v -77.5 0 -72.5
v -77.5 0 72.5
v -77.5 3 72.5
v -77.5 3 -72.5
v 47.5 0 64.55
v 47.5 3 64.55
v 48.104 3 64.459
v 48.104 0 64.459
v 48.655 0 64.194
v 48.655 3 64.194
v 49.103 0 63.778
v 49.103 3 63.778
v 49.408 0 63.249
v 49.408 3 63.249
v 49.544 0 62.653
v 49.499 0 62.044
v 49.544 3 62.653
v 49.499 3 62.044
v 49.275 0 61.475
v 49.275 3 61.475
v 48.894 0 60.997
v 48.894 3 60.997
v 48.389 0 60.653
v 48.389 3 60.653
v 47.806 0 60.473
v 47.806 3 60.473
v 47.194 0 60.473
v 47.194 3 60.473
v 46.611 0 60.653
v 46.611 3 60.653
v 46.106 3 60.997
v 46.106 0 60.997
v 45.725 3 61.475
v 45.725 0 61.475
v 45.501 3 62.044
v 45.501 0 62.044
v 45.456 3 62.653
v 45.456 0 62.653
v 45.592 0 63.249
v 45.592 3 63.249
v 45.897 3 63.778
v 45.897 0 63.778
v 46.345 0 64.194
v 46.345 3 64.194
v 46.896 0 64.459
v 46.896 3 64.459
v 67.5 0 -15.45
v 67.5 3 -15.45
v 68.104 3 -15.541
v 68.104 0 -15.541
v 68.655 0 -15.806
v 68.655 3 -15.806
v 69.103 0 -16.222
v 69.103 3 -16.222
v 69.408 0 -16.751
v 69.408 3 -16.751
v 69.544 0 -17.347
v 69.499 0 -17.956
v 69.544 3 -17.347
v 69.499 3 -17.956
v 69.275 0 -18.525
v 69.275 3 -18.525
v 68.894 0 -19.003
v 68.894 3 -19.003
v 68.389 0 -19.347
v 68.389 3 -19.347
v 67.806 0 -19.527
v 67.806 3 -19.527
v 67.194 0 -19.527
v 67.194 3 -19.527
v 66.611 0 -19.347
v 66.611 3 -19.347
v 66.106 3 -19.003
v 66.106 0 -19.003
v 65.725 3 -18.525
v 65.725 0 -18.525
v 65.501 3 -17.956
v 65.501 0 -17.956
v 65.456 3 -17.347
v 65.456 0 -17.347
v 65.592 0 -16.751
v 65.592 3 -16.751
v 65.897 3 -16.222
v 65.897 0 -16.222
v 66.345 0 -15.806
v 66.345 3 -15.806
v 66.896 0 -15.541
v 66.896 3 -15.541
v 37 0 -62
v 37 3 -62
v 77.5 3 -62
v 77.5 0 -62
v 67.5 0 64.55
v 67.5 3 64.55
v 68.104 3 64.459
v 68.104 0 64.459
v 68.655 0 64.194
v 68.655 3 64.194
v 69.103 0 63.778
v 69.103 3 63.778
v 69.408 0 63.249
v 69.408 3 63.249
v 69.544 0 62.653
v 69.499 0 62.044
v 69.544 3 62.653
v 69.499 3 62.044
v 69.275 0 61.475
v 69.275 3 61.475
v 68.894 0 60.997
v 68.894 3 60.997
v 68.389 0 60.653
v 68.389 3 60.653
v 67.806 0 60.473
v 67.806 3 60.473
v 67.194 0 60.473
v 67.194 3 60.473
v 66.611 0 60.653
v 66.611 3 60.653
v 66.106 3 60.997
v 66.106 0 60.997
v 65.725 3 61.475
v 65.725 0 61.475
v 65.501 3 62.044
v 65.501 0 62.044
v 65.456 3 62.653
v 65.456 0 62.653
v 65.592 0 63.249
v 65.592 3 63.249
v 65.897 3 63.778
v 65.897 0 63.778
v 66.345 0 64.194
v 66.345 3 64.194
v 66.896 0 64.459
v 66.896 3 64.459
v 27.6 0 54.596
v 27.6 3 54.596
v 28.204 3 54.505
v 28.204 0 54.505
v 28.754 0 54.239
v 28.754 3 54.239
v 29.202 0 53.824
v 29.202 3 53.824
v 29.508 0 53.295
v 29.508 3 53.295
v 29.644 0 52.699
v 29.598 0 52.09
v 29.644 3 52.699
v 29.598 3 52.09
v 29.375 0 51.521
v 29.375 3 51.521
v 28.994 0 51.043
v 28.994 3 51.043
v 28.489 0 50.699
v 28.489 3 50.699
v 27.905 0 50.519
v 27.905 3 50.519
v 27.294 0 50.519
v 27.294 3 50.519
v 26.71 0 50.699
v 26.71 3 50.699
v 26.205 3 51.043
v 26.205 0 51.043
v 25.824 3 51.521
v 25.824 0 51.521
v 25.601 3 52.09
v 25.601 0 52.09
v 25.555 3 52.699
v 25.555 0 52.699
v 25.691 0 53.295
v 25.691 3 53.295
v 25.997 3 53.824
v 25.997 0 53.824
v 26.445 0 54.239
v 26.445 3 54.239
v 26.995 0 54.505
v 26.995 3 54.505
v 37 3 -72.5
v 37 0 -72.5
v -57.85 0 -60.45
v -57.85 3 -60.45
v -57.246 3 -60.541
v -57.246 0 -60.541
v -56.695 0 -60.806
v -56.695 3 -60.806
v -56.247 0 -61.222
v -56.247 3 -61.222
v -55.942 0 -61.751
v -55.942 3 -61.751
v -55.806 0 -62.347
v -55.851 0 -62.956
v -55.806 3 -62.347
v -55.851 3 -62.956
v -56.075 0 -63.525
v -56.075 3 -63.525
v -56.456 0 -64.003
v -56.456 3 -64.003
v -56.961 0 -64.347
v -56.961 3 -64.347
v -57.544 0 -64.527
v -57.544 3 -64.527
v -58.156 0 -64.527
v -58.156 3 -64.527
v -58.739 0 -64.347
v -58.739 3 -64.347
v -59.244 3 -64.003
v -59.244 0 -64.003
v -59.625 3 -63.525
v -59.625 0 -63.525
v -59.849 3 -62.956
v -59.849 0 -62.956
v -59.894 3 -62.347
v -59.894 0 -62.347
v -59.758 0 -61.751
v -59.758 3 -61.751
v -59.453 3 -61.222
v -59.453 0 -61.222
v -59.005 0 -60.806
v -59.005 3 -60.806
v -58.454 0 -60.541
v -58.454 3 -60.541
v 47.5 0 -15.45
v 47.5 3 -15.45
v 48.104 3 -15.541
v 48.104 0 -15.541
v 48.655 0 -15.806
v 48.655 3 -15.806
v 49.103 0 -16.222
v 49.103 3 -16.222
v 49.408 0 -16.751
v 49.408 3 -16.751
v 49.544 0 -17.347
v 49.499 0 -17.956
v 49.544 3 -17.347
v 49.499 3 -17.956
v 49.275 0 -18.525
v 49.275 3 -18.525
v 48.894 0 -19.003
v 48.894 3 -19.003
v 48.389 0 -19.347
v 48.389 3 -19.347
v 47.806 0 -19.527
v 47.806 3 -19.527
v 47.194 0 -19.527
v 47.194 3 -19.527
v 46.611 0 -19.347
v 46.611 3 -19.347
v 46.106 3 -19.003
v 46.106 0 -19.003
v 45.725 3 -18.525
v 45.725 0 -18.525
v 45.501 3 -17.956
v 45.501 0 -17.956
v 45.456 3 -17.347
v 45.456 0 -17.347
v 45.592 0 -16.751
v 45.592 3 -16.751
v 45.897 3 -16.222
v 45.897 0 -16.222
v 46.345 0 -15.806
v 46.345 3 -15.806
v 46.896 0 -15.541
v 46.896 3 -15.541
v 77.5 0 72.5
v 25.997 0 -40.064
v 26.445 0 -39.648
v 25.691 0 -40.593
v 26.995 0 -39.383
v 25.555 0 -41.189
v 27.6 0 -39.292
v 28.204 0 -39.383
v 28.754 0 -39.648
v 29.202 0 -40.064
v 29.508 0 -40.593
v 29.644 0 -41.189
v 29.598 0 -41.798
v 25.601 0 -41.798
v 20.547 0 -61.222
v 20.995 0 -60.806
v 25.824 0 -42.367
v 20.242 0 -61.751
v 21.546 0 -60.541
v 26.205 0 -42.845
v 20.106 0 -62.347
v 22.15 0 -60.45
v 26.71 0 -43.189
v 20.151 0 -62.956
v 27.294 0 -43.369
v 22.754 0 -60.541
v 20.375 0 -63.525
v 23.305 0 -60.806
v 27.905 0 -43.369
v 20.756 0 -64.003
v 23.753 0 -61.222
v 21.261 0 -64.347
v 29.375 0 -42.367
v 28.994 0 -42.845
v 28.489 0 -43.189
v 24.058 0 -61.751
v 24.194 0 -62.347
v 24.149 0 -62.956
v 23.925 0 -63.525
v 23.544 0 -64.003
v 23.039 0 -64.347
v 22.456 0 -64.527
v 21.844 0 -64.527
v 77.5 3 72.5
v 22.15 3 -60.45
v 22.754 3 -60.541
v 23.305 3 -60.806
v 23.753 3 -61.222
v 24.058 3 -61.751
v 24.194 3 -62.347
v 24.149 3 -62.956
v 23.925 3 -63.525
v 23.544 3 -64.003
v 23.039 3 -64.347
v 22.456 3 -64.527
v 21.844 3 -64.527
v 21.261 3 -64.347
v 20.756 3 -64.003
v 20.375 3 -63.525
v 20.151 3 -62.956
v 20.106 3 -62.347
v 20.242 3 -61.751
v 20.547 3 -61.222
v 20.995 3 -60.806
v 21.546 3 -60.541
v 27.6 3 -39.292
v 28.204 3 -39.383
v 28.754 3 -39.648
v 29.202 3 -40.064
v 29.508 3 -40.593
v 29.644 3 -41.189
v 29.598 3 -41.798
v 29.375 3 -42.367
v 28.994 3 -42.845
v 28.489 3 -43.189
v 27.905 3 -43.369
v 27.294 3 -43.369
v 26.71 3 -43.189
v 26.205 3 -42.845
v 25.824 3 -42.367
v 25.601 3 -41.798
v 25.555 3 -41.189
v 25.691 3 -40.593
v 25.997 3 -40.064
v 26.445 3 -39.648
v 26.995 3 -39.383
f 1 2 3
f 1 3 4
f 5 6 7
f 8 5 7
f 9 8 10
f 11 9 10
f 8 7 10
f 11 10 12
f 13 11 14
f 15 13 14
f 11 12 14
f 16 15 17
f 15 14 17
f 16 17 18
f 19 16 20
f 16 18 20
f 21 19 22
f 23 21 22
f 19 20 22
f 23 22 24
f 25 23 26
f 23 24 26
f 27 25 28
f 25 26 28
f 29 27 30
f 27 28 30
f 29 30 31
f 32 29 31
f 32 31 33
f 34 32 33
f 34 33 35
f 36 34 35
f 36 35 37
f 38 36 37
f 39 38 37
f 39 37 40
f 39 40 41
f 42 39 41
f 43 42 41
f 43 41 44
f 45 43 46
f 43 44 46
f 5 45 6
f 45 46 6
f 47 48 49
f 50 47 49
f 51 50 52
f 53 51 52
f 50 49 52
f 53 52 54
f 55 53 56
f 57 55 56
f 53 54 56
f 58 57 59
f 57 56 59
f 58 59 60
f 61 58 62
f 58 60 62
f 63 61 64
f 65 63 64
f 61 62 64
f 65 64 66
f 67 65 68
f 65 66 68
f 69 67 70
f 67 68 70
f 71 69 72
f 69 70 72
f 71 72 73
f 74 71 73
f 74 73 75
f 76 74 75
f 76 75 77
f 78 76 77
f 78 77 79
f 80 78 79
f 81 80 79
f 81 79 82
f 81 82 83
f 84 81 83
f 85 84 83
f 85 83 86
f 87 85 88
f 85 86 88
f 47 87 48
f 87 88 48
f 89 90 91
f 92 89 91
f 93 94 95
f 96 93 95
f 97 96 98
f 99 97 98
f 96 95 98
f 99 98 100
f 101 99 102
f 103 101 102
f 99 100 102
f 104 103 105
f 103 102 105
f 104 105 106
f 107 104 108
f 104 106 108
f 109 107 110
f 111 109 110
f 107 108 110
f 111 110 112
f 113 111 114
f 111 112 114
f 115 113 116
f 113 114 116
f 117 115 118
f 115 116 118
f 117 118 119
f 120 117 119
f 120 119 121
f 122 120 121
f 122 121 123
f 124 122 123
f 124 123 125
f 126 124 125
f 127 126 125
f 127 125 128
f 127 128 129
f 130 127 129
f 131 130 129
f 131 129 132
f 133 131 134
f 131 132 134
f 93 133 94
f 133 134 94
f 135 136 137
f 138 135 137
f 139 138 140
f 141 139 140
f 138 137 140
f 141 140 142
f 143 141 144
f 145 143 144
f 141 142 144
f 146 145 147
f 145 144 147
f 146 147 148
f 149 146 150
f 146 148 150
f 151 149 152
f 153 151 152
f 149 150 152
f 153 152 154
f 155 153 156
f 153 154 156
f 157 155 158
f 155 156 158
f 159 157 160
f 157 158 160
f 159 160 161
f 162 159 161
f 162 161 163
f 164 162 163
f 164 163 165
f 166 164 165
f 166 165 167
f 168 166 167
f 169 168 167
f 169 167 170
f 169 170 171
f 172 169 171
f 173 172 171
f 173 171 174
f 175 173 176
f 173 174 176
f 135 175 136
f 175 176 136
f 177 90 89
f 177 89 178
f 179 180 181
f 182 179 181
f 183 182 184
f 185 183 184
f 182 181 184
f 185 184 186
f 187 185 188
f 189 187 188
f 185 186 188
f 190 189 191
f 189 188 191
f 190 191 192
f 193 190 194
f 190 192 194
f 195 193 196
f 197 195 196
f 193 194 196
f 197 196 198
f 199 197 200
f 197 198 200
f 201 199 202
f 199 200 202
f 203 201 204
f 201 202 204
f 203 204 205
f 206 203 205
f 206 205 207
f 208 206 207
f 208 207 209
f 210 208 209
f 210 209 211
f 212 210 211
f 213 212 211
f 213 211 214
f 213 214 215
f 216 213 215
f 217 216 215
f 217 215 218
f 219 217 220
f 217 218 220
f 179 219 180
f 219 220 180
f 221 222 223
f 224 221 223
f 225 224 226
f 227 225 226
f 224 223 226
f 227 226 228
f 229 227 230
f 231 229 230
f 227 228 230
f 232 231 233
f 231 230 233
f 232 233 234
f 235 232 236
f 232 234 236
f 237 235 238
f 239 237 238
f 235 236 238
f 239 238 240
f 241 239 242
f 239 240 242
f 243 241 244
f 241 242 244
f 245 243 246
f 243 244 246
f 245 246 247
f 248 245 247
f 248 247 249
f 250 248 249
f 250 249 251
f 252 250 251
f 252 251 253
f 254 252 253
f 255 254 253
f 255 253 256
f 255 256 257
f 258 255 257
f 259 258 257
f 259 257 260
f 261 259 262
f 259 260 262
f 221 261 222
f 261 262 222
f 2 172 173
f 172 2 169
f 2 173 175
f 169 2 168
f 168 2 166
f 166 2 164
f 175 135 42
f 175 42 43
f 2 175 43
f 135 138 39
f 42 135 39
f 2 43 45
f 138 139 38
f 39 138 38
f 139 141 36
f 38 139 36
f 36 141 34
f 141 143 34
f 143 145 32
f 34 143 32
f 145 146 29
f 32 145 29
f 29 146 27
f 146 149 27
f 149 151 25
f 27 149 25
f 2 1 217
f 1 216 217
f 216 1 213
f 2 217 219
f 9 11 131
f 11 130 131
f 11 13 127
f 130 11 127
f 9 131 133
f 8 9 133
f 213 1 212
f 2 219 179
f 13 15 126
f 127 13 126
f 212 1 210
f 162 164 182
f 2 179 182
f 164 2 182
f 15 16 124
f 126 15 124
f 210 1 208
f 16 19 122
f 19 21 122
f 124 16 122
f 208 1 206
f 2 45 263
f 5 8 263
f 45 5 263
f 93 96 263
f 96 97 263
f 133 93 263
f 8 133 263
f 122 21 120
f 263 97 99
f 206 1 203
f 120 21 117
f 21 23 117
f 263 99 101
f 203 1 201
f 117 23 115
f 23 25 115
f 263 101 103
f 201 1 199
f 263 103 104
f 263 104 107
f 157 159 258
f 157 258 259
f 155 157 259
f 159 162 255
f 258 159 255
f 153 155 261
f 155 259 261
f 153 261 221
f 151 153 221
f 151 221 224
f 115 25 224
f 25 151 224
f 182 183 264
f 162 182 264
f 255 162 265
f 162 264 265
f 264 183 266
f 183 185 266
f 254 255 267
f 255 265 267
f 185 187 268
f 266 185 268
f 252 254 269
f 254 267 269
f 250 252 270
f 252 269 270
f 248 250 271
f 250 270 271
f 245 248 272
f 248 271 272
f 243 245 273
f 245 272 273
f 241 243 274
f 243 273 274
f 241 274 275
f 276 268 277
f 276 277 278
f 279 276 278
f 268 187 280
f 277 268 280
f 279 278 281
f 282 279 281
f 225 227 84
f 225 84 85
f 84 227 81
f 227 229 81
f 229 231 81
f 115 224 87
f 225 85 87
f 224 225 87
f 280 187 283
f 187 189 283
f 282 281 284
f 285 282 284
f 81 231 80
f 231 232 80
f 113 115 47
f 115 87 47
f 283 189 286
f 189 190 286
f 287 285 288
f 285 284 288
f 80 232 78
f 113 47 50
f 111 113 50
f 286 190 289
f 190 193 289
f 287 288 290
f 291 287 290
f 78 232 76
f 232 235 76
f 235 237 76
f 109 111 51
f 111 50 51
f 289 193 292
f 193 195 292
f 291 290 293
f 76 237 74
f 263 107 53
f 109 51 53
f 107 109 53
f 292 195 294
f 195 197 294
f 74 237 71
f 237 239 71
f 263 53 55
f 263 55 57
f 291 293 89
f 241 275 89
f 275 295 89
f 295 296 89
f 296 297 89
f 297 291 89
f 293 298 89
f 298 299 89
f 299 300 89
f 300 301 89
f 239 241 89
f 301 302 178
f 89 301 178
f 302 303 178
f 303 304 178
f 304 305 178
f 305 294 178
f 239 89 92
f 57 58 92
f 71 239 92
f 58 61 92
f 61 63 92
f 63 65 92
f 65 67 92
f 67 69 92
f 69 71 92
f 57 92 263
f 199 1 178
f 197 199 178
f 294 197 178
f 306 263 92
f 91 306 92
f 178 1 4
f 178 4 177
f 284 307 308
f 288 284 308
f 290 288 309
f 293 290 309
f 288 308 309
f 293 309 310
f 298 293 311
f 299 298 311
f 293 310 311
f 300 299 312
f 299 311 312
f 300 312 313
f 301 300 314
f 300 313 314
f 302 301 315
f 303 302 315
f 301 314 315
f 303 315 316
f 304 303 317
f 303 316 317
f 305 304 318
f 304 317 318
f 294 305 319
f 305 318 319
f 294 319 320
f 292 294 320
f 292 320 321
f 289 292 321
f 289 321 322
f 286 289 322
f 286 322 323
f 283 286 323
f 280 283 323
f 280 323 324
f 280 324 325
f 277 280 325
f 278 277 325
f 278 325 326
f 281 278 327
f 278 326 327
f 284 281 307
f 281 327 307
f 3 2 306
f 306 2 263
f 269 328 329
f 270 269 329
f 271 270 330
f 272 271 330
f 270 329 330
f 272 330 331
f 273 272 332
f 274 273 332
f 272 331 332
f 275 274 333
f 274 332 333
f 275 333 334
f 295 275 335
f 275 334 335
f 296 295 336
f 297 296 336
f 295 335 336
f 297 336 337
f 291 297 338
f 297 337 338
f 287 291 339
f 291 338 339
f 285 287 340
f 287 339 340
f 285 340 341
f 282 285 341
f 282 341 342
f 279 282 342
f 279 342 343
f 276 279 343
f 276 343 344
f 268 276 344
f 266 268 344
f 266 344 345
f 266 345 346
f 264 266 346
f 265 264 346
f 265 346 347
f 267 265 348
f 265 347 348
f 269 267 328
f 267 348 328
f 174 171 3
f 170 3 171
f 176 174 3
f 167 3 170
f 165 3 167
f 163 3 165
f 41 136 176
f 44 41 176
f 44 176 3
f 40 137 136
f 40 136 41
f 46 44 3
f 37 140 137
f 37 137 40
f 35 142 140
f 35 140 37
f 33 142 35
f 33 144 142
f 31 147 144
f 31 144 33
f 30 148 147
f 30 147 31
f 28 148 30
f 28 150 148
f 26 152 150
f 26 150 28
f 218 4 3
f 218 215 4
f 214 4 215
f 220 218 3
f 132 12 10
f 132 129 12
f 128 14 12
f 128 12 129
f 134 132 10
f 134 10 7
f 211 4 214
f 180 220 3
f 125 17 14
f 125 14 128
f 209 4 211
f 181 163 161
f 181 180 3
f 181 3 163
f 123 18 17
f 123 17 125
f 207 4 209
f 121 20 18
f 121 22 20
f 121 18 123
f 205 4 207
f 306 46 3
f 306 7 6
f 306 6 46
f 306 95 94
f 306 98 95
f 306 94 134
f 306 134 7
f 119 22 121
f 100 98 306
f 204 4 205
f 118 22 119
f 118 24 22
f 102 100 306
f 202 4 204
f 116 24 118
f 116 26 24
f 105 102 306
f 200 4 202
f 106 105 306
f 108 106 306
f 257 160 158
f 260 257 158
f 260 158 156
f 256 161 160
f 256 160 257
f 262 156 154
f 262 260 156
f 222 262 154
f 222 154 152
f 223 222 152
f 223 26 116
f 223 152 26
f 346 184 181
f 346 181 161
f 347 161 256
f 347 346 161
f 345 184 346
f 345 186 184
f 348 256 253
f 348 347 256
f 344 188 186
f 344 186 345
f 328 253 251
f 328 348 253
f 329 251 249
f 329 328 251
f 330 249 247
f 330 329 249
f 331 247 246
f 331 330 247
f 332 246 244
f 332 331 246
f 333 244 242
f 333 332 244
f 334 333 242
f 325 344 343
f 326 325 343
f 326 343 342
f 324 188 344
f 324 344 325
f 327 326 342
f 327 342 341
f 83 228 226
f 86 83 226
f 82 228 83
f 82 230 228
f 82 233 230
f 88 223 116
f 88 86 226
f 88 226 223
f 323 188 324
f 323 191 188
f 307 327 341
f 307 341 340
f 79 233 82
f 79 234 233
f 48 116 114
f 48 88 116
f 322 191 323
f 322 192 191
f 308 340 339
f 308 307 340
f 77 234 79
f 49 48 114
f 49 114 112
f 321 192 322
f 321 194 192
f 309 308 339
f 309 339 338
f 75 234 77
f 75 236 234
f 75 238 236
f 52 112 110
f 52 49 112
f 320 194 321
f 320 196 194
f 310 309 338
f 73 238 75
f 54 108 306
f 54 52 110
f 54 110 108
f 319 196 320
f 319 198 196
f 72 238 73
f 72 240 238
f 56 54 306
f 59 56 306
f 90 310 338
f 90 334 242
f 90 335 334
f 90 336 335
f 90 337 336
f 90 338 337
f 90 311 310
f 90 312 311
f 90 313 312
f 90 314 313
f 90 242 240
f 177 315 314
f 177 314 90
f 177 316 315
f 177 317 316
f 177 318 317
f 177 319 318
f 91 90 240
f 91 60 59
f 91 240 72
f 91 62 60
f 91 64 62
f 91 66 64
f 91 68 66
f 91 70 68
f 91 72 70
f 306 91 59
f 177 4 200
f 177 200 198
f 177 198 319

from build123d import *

# Parameters (mm, degrees)
SKETCH2_W           = 155
SKETCH2_H           = 145
BOSS_EXTRUDE1_DEPTH = 3
SKETCH4_W           = 40.5
SKETCH4_H           = 10.5
CUT_EXTRUDE1_DEPTH  = 3
SKETCH5_R           = 2.05
CUT_EXTRUDE2_DEPTH  = 3
SKETCH6_R           = 2.05
CUT_EXTRUDE3_DEPTH  = 3


with BuildPart() as part:
    # Sketch2 → Boss-Extrude1 (new body)
    with BuildSketch(Plane(origin=(0, 0, 0), x_dir=(1, 0, 0), z_dir=(0, 1, 0))):
        Rectangle(SKETCH2_W, SKETCH2_H)
    extrude(amount=BOSS_EXTRUDE1_DEPTH)

    # Sketch4 → Cut-Extrude1 (cut)
    with BuildSketch(Plane(origin=(0, 3, 0), x_dir=(1, 0, 0), z_dir=(0, 1, 0))):
        with Locations((57.25, 67.25)):
            Rectangle(SKETCH4_W, SKETCH4_H)
    extrude(amount=-CUT_EXTRUDE1_DEPTH, mode=Mode.SUBTRACT)

    # Sketch5 → Cut-Extrude2 (cut)
    with BuildSketch(Plane(origin=(0, 3, 0), x_dir=(1, 0, 0), z_dir=(0, 1, 0))):
        with Locations(Location((-57.85, 62.5, 0), (0, 0, 270))):
            Circle(SKETCH5_R)
        with Locations(Location((22.15, 62.5, 0), (0, 0, 270))):
            Circle(SKETCH5_R)
        with Locations(Location((47.5, 17.5, 0), (0, 0, 270))):
            Circle(SKETCH5_R)
        with Locations(Location((67.5, 17.5, 0), (0, 0, 270))):
            Circle(SKETCH5_R)
        with Locations(Location((47.5, -62.5, 0), (0, 0, 270))):
            Circle(SKETCH5_R)
        with Locations(Location((67.5, -62.5, 0), (0, 0, 270))):
            Circle(SKETCH5_R)
    extrude(amount=-CUT_EXTRUDE2_DEPTH, mode=Mode.SUBTRACT)

    # Sketch6 → Cut-Extrude3 (cut)
    with BuildSketch(Plane(origin=(0, 3, 0), x_dir=(1, 0, 0), z_dir=(0, 1, 0))):
        with Locations(Location((27.599633374, -52.545679653, 0), (0, 0, 270))):
            Circle(SKETCH6_R)
        with Locations(Location((27.599633374, 41.341825757, 0), (0, 0, 270))):
            Circle(SKETCH6_R)
    extrude(amount=-CUT_EXTRUDE3_DEPTH, mode=Mode.SUBTRACT)


solid = part.part
